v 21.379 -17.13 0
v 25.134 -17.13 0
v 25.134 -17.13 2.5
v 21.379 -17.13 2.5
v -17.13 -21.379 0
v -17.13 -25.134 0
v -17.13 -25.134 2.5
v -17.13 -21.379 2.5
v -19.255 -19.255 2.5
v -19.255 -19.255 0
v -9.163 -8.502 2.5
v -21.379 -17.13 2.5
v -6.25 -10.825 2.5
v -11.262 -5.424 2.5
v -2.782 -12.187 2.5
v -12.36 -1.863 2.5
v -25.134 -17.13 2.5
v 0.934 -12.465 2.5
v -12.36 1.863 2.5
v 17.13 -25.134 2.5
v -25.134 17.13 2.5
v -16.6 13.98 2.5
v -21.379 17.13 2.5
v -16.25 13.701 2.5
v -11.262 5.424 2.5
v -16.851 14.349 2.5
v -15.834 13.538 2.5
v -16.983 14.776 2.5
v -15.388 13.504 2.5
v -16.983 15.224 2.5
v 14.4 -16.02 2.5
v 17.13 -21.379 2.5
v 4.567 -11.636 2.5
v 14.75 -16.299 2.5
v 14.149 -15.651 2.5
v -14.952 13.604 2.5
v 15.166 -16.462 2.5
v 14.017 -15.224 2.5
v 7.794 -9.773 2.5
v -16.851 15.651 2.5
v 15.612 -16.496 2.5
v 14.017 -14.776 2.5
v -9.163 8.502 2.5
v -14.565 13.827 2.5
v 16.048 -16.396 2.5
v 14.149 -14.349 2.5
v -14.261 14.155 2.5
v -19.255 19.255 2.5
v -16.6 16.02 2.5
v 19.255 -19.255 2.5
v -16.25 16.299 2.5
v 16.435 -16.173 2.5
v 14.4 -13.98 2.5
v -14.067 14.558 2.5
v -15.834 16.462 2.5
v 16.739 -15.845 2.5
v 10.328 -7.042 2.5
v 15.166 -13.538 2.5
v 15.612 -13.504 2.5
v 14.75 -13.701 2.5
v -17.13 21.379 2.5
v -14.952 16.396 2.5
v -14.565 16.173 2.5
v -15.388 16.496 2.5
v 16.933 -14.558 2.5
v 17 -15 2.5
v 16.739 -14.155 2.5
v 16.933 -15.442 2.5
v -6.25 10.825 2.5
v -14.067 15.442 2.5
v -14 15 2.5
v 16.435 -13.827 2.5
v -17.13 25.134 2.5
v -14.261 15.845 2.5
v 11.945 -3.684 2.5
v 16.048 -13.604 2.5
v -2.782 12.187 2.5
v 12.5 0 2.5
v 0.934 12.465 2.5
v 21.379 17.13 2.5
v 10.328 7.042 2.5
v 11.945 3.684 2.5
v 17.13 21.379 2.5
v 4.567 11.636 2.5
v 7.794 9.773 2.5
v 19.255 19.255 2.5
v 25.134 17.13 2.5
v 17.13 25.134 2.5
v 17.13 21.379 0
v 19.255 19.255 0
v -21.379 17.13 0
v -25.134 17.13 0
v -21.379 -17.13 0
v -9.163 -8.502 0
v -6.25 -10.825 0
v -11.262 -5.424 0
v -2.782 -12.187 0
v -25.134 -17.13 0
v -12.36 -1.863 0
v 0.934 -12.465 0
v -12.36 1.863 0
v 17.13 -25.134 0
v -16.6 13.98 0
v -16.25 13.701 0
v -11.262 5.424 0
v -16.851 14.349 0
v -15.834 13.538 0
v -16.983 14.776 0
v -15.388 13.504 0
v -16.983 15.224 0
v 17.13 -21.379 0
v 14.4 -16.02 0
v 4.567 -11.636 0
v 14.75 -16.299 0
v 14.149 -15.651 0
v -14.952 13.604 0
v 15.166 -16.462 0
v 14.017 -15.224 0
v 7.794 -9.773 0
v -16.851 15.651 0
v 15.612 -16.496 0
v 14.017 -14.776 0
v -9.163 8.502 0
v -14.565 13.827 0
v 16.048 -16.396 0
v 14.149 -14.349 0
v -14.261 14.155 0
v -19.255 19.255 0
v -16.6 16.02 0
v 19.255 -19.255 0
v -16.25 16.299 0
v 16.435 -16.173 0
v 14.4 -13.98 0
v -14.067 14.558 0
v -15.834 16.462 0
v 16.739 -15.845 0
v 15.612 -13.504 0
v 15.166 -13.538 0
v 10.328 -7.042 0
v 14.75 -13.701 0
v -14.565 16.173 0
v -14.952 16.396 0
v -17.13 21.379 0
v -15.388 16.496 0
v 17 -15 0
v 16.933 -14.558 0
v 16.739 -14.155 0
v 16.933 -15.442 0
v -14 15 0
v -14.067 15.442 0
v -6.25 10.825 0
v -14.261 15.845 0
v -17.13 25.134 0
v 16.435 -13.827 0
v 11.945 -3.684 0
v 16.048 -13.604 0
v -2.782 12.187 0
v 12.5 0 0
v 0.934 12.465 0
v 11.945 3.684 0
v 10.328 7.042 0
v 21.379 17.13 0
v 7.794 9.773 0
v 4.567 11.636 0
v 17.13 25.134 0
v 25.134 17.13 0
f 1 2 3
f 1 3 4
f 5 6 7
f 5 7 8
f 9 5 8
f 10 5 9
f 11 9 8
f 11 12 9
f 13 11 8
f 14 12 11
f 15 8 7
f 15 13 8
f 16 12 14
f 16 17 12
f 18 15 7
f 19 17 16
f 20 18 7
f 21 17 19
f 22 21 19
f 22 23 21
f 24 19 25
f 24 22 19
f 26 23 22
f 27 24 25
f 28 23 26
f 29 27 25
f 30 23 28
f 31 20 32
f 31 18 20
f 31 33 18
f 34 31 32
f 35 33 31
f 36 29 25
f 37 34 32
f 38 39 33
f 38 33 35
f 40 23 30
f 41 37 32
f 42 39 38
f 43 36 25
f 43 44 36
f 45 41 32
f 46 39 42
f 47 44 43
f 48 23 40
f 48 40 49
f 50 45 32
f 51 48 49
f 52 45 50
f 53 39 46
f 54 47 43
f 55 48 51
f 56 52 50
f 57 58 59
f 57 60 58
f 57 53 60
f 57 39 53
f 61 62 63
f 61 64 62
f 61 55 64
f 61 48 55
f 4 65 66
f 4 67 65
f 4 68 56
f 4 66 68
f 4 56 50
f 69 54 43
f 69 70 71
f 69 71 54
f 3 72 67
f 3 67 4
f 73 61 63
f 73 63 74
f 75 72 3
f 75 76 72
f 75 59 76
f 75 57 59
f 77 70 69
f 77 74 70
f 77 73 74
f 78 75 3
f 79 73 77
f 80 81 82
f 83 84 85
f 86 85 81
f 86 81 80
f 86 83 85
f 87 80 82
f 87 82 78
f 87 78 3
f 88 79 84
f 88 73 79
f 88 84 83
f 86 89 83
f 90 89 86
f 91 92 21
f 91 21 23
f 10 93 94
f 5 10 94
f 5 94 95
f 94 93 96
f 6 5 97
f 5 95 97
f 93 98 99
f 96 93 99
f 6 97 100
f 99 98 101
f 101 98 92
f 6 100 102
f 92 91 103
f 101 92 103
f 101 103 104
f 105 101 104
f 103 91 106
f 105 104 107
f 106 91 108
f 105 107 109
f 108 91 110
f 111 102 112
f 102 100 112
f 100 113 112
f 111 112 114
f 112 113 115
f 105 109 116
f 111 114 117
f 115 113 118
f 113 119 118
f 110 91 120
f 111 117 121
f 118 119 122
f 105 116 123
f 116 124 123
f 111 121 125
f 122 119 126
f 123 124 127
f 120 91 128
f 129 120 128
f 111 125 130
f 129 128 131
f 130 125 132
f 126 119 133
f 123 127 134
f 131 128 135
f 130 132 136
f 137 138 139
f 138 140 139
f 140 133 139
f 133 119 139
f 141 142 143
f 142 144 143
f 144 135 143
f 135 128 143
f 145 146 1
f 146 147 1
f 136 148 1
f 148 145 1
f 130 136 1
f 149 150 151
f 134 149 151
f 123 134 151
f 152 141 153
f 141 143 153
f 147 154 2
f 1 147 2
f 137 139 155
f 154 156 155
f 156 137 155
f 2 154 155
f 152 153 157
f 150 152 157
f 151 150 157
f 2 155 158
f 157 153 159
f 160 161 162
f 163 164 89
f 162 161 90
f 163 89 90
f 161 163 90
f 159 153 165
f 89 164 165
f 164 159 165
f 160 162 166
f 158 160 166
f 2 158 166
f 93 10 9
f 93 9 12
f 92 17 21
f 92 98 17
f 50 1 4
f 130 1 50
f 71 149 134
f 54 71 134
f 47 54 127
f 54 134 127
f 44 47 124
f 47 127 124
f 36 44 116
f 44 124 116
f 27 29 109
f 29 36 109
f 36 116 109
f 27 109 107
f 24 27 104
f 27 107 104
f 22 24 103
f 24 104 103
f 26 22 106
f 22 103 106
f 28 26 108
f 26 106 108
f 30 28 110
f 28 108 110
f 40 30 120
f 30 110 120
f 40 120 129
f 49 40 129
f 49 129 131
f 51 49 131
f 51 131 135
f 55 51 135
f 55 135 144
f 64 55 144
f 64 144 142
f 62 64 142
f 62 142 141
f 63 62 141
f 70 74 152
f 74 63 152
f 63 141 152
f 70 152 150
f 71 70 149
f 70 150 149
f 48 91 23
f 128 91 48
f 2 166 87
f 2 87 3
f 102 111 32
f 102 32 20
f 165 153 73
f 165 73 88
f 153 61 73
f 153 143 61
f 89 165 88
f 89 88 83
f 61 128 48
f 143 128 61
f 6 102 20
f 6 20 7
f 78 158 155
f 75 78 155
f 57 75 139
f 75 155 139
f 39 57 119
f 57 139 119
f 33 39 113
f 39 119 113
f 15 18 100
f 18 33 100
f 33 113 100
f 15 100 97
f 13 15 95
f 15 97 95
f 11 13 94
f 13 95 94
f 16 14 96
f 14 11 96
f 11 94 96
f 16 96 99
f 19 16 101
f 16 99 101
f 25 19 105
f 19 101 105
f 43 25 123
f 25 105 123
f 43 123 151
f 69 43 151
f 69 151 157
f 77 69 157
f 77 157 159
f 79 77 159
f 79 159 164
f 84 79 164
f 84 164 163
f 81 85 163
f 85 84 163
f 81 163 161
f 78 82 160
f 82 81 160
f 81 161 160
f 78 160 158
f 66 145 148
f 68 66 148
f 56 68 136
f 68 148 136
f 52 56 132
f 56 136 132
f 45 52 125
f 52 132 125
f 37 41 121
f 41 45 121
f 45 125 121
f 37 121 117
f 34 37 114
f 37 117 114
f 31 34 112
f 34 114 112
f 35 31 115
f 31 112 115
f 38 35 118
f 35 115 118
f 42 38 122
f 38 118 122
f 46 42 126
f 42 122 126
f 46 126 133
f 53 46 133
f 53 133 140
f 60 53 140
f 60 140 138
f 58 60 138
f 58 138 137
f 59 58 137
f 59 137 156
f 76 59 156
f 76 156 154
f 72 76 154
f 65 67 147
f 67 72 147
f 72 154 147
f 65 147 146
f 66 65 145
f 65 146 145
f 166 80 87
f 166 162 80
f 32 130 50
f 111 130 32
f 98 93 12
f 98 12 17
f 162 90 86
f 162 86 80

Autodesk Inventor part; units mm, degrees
ref_plane "YZ Plane" through (0, 0, 0) normal (1, 0, 0) x (0, 1, 0)
ref_plane "XZ Plane" through (0, 0, 0) normal (0, 1, 0) x (-1, 0, 0)
ref_plane "XY Plane" through (0, 0, 0) normal (0, 0, 1) x (1, 0, 0)
sketch "Sketch1" plane through (0, 0, 0) normal (0, 0, 1) x (1, 0, 0)
  line L0 (-38.1609, 0) -> (53.0268, 0) construction
  line L1 (0, -35.8177) -> (0, 38.9679) construction
  line L2 (0, 0) -> (28.2843, 28.2843) construction
  line L3 (0, 0) -> (40, 0) construction
  line L4 (0, 24.9041) -> (16.9, 24.9041)
  line L5 (16.9, 24.9041) -> (16.9, 21.2841)
  line L6 (16.9, 21.2841) -> (19.092, 19.092)
  line L7 (24.9041, 0) -> (24.9041, 16.9)
  line L8 (24.9041, 16.9) -> (21.2841, 16.9)
  line L9 (21.2841, 16.9) -> (19.092, 19.092)
  line L10 (0, 24.9041) -> (-16.9, 24.9041)
  line L11 (-16.9, 24.9041) -> (-16.9, 21.2841)
  line L12 (-16.9, 21.2841) -> (-19.092, 19.092)
  line L13 (-24.9041, 0) -> (-24.9041, 16.9)
  line L14 (-24.9041, 16.9) -> (-21.2841, 16.9)
  line L15 (-21.2841, 16.9) -> (-19.092, 19.092)
  line L16 (0, -24.9041) -> (16.9, -24.9041)
  line L17 (16.9, -24.9041) -> (16.9, -21.2841)
  line L18 (16.9, -21.2841) -> (19.092, -19.092)
  line L19 (24.9041, 0) -> (24.9041, -16.9)
  line L20 (24.9041, -16.9) -> (21.2841, -16.9)
  line L21 (21.2841, -16.9) -> (19.092, -19.092)
  line L22 (0, -24.9041) -> (-16.9, -24.9041)
  line L23 (-16.9, -24.9041) -> (-16.9, -21.2841)
  line L24 (-16.9, -21.2841) -> (-19.092, -19.092)
  line L25 (-24.9041, 0) -> (-24.9041, -16.9)
  line L26 (-24.9041, -16.9) -> (-21.2841, -16.9)
  line L27 (-21.2841, -16.9) -> (-19.092, -19.092)
  circle A0 centre (0, 0) radius 12.5
  circle A1 centre (-15.5, 15) radius 1.5
  line L28 (-18.5, 18) -> (-12.5, 18) construction
  line L29 (-12.5, 18) -> (-12.5, -12) construction
  line L30 (-12.5, -12) -> (-18.5, -12) construction
  line L31 (-18.5, -12) -> (-18.5, 18) construction
  line L32 (-15.5, 18) -> (-15.5, -12) construction
  circle A2 centre (15.5, -15) radius 1.5
  line L33 (-17.13, 25.1341) -> (0, 25.1341)
  line L34 (0, 25.1341) -> (17.13, 25.1341)
  line L35 (17.13, 25.1341) -> (17.13, 21.3793)
  line L36 (17.13, 21.3793) -> (19.2547, 19.2547)
  line L37 (19.2547, 19.2547) -> (21.3793, 17.13)
  line L38 (21.3793, 17.13) -> (25.1341, 17.13)
  line L39 (25.1341, 17.13) -> (25.1341, 0)
  line L40 (25.1341, 0) -> (25.1341, -17.13)
  line L41 (25.1341, -17.13) -> (21.3793, -17.13)
  line L42 (21.3793, -17.13) -> (19.2547, -19.2547)
  line L43 (19.2547, -19.2547) -> (17.13, -21.3793)
  line L44 (17.13, -21.3793) -> (17.13, -25.1341)
  line L45 (17.13, -25.1341) -> (0, -25.1341)
  line L46 (0, -25.1341) -> (-17.13, -25.1341)
  line L47 (-17.13, -25.1341) -> (-17.13, -21.3793)
  line L48 (-17.13, -21.3793) -> (-19.2547, -19.2547)
  line L49 (-19.2547, -19.2547) -> (-21.3793, -17.13)
  line L50 (-21.3793, -17.13) -> (-25.1341, -17.13)
  line L51 (-25.1341, -17.13) -> (-25.1341, 0)
  line L52 (-25.1341, 0) -> (-25.1341, 17.13)
  line L53 (-25.1341, 17.13) -> (-21.3793, 17.13)
  line L54 (-21.3793, 17.13) -> (-19.2547, 19.2547)
  line L55 (-19.2547, 19.2547) -> (-17.13, 21.3793)
  line L56 (-17.13, 21.3793) -> (-17.13, 25.1341)
  dimension "d0" = 45
  dimension "d1" = 16.9
  dimension "d2" = 3.62
  dimension "d3" = 3.1
  dimension "d4" = 25
  dimension "d5" = 3
  dimension "d11" = 6
  dimension "d12" = 3
  dimension "d14" = 15
  dimension "d15" = 3
  dimension "d16" = 15
  dimension "d17" = 15.5
  dimension "d18" = 15.5
  dimension "d19" = 30
  dimension "d20" = 0.23
extrude "Extrusion1" add sketch "Sketch1" along normal blind 2.5 contours L4 L5 L6 L9 L8 L7 L19 L20 L21 L18 L17 L16 L22 L23 L24 L27 L26 L25 L13 L14 L15 L12 L11 L10 | L33 L34 L35 L36 L37 L38 L39 L40 L41 L42 L43 L44 L45 L46 L47 L48 L49 L50 L51 L52 L53 L54 L55 L56
properties part number "LC_sample_holder_insert"
